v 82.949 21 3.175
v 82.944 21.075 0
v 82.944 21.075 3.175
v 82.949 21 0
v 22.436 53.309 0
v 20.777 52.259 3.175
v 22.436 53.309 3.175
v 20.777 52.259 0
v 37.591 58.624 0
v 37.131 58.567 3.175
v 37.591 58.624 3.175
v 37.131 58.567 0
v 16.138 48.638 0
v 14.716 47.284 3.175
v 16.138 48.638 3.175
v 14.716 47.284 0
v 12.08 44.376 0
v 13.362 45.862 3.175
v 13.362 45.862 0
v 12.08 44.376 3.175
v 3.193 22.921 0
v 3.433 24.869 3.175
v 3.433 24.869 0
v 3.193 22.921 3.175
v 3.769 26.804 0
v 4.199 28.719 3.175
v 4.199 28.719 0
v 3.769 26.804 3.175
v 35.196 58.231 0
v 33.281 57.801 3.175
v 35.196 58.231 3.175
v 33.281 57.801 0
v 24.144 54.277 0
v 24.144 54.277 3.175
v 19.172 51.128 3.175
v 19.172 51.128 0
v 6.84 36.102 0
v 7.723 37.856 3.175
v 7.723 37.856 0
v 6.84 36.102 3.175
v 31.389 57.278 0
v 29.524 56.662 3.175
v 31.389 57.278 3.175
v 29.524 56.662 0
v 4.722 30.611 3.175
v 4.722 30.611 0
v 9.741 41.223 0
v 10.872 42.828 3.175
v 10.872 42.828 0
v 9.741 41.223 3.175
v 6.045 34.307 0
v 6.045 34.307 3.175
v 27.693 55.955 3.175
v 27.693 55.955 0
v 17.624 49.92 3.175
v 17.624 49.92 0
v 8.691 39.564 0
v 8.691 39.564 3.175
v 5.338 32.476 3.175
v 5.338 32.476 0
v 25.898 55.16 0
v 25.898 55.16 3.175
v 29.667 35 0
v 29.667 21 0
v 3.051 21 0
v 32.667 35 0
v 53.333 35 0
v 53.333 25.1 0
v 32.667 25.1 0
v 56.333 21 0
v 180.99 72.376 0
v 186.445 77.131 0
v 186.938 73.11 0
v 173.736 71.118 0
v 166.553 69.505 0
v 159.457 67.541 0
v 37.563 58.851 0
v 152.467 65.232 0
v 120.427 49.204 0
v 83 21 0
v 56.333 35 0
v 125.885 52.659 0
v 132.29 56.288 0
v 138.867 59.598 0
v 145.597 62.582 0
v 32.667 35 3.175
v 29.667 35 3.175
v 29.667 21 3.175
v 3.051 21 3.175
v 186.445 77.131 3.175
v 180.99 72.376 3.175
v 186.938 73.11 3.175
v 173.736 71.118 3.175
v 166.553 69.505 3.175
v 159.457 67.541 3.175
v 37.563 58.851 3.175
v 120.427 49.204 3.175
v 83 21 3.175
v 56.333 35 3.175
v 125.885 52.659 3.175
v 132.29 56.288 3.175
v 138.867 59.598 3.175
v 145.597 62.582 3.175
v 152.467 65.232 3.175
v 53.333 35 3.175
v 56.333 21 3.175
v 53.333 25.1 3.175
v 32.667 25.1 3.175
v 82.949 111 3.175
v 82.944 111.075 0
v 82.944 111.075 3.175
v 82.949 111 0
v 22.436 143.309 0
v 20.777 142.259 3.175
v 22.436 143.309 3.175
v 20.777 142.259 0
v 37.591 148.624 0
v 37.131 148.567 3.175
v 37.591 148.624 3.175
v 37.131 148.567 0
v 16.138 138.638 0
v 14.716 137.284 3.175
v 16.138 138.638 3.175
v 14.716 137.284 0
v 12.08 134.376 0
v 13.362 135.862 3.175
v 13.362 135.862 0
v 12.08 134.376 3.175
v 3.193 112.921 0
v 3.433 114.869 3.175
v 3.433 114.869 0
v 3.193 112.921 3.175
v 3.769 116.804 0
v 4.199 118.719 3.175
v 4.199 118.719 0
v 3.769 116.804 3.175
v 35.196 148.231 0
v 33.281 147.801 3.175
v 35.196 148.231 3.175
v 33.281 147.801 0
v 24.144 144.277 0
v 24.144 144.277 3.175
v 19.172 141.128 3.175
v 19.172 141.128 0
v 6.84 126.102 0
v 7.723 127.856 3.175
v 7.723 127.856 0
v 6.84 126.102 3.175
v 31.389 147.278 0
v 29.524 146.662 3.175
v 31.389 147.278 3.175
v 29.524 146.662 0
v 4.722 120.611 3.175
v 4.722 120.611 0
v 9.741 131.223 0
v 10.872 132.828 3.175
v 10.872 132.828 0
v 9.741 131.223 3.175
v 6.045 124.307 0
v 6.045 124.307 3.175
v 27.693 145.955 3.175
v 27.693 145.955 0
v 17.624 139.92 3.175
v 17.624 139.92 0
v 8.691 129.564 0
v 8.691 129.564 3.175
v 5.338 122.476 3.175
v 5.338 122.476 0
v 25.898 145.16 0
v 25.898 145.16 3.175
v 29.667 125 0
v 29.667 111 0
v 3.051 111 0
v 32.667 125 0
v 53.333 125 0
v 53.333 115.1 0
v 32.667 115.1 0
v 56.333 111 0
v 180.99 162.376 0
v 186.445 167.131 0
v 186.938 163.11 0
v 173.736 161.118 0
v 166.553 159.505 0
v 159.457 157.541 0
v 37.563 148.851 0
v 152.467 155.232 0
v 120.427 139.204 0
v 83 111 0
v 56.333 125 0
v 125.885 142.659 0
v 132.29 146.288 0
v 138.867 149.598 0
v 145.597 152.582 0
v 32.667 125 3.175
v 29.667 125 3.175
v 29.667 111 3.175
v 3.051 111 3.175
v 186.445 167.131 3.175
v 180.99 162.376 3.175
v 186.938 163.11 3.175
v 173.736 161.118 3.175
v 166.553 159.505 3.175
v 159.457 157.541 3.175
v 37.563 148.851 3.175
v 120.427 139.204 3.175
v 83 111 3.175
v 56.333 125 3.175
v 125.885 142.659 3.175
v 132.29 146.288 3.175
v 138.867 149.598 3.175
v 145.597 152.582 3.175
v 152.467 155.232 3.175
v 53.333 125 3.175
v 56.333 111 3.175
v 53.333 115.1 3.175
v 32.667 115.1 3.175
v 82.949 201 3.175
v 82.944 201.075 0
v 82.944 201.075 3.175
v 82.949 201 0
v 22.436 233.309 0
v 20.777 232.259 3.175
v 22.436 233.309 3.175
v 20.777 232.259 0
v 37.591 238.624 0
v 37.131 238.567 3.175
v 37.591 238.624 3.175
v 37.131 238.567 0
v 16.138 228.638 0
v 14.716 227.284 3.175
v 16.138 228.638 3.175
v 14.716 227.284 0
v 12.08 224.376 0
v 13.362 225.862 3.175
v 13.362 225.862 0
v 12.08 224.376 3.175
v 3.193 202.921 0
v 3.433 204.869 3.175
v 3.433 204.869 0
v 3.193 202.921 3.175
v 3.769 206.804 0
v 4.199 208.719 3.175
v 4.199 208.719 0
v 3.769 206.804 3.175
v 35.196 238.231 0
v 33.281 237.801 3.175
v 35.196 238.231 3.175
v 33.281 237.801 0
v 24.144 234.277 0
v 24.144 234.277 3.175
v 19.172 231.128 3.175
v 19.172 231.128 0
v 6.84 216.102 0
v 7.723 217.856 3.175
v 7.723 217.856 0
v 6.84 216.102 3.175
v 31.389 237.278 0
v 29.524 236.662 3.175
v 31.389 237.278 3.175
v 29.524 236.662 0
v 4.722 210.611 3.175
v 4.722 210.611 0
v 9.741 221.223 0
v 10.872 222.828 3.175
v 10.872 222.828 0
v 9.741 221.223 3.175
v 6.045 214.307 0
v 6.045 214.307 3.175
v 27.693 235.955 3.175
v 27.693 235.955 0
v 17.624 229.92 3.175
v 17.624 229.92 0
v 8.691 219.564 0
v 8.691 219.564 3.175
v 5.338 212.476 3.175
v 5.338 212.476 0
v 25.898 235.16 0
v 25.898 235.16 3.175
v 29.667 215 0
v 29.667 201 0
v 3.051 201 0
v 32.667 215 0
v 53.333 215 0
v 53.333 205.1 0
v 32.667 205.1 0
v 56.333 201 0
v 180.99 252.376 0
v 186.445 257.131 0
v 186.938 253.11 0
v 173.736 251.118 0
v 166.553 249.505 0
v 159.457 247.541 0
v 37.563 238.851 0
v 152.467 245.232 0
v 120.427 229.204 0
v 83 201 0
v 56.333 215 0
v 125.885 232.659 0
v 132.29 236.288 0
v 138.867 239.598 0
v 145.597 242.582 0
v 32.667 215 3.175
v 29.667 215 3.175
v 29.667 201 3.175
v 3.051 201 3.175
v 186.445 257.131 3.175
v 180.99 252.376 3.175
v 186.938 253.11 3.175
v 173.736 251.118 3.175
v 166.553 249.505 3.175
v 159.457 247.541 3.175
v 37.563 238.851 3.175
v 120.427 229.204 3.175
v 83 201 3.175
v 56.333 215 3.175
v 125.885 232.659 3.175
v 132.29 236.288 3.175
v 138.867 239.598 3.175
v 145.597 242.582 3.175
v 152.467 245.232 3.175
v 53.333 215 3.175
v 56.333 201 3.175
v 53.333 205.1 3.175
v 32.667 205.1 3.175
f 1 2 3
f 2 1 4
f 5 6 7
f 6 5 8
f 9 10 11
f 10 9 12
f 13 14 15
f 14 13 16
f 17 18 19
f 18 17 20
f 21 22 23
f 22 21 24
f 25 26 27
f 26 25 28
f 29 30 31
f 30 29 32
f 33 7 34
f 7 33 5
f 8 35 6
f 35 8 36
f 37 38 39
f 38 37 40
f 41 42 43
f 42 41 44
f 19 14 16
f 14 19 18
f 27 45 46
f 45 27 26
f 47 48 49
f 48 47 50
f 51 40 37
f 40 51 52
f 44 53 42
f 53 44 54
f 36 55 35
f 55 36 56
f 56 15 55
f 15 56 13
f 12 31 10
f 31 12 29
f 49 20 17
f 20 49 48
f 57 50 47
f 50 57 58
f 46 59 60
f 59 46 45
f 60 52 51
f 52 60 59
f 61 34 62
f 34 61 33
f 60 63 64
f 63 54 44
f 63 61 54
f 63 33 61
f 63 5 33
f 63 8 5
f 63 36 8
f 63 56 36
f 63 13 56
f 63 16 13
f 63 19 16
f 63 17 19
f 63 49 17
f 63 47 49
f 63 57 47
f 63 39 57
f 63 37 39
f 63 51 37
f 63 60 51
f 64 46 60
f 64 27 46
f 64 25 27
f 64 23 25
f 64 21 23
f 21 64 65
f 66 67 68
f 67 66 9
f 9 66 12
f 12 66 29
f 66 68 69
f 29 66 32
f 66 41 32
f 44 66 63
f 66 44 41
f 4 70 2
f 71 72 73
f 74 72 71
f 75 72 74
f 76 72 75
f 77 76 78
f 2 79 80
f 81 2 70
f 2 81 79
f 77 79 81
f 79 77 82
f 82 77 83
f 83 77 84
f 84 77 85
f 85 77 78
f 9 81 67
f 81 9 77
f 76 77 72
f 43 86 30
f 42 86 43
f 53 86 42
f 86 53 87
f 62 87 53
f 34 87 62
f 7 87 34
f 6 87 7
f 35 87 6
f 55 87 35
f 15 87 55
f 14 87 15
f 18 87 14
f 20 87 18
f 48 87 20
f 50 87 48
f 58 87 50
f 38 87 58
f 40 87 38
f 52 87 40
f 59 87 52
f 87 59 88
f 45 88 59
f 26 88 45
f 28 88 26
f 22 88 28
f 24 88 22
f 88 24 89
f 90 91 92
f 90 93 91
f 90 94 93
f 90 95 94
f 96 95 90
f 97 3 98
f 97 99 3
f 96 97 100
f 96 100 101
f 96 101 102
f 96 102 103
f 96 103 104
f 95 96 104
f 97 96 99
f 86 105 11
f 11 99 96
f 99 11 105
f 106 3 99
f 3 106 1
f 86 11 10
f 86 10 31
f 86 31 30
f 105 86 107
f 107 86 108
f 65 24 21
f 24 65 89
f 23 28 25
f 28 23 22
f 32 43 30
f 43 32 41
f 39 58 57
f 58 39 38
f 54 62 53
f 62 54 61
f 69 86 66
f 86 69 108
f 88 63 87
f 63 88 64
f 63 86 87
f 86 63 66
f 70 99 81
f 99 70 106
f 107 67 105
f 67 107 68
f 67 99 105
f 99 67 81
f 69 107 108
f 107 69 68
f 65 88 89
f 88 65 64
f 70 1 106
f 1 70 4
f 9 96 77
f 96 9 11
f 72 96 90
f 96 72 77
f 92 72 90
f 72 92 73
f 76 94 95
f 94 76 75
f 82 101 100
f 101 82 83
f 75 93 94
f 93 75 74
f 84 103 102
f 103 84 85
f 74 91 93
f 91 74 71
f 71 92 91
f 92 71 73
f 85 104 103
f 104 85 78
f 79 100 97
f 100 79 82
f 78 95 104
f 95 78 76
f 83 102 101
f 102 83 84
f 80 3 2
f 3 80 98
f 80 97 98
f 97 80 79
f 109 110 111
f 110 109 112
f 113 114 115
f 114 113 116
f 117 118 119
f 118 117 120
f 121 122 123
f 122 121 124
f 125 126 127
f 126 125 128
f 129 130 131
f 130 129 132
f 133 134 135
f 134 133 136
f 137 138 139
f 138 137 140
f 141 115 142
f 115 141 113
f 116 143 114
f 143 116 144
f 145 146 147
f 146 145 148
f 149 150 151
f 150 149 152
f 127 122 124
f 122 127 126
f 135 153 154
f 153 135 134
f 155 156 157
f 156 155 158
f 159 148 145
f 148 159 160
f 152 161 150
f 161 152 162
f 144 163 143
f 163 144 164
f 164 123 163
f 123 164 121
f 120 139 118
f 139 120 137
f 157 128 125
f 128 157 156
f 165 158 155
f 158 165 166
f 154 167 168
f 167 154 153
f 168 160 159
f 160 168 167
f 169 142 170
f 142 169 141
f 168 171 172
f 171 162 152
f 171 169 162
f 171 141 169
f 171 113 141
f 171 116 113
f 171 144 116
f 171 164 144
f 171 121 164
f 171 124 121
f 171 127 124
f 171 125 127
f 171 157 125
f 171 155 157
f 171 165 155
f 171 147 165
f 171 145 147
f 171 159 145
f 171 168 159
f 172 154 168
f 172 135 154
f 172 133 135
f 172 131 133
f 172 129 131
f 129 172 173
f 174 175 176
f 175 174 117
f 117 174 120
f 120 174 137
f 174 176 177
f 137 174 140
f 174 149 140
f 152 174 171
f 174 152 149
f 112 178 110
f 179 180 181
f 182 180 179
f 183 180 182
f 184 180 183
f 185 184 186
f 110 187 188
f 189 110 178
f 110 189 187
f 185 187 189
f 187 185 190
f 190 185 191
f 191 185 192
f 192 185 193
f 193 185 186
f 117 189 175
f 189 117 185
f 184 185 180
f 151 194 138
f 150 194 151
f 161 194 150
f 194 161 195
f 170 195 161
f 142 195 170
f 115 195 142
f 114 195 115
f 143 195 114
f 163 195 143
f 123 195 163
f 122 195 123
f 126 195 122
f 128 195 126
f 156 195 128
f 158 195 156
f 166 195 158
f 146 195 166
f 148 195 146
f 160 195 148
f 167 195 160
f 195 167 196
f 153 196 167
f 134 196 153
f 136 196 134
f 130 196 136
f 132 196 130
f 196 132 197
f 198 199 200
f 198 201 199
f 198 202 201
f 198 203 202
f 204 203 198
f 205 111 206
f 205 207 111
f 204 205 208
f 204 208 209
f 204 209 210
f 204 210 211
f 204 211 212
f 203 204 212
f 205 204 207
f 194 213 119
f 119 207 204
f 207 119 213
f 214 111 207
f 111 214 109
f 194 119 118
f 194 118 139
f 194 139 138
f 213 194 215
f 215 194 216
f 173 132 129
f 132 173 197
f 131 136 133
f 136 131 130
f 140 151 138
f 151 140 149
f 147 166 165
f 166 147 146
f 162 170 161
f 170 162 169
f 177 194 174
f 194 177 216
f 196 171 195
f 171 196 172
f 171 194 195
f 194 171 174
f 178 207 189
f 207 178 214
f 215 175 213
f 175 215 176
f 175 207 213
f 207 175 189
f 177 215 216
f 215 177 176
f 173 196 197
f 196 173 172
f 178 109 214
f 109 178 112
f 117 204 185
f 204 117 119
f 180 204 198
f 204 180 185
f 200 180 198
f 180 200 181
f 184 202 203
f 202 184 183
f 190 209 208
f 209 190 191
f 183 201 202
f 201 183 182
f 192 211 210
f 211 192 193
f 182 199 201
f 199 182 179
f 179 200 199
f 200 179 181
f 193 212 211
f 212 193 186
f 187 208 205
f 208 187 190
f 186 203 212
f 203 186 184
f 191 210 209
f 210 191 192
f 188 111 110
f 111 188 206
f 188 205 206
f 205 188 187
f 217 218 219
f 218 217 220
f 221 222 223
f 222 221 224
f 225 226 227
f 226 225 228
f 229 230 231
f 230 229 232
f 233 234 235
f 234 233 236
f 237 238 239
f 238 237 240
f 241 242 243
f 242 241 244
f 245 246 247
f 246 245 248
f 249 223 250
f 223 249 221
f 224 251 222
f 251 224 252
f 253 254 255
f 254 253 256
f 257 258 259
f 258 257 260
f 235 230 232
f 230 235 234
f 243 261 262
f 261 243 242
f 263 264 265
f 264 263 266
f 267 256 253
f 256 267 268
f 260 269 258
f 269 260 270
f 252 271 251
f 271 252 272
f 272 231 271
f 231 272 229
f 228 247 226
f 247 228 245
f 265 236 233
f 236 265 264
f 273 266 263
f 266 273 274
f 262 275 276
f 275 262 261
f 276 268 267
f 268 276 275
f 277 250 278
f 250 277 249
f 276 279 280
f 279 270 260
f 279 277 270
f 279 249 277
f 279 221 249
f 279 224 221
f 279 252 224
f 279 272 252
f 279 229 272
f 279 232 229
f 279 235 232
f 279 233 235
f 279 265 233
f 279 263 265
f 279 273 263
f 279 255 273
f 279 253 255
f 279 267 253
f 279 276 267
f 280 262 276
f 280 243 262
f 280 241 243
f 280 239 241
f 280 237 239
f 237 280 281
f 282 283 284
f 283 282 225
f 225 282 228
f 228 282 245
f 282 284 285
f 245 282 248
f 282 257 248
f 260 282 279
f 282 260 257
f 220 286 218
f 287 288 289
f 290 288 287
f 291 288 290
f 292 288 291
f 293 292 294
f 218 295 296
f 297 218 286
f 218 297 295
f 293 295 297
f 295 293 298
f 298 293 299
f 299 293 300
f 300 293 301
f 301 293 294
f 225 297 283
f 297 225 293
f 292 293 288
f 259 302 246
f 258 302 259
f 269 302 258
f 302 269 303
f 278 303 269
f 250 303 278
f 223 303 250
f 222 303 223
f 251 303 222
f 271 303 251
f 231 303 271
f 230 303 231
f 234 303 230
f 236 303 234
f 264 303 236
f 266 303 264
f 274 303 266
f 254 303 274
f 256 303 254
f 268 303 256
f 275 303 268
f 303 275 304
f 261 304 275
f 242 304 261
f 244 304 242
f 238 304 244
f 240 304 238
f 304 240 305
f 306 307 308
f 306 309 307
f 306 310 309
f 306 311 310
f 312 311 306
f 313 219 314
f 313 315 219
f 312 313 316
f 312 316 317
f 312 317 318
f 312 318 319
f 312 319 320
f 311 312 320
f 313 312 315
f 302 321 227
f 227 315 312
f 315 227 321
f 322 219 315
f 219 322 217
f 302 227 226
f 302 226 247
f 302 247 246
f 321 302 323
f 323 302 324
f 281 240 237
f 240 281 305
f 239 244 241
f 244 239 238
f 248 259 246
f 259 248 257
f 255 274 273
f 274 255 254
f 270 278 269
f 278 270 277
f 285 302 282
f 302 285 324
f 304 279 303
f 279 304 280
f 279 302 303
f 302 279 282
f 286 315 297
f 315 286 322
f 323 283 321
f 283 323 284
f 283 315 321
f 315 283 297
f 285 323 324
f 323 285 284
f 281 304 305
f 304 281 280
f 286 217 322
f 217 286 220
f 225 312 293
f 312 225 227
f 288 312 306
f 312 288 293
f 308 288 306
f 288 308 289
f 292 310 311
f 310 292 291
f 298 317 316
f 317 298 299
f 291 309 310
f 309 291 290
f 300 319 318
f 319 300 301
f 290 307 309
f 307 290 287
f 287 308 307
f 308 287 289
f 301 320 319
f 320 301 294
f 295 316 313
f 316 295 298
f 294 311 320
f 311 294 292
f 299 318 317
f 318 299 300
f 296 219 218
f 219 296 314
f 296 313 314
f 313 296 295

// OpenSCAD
// file: ../libs/bearing_mount_lib.scad
module rounded_rect_x (r, l, h) {
   $rect_l = l;
   $rect_w = 4 * r;
   $rect_h = h;
   union () {
	   translate([2*r, 0, 0]) {
		    cube([$rect_l, $rect_w, $rect_h]);
	   }
	   translate([2*r, 2*r, 0]) {
		    cylinder(r=2*r, h=h);
	   }
	   translate([2*r+l, 2*r, 0]) {
		    cylinder(r=2*r, h=h);
	   }  
   }
}

module rounded_rect_p_x (r, l, h) {
   difference () {
      rounded_rect_x(r, l, h);
      translate([2*r, 2*r, -1])  {
         cylinder(r=r, h=h+2);
      }  
      translate([2*r, l+2*r, -1])  {
         cylinder(r=r, h=h+2);
      } 
   }
}

module rounded_rect_y (r, l, h) {
   $rect_l = l;
   $rect_w = 4 * r;
   $rect_h = h;
   union () {
	   translate([0, 2*r, 0]) {
		    cube([$rect_w, $rect_l, $rect_h]);
	   }
	   translate([2*r, 2*r, 0]) {
		    cylinder(r=2*r, h=h);
	   }
	   translate([2*r, 2*r+l, 0]) {
		    cylinder(r=2*r, h=h);
	   }  
   }
}


module rounded_rect_p_y (r, l, h) {
   difference () {
      rounded_rect_y(r, l, h);
      translate([2*r, 2*r, -1])  {
         cylinder(r=r, h=h+2);
      }  
      translate([2*r, l+2*r, -1])  {
         cylinder(r=r, h=h+2);
      } 
   }
}

$pierced = 1;
if (1 == $pierced) {
   union () {
      rounded_rect_p_x(r=5, l=60, h=6.35);
      rounded_rect_p_y(r=5, l=60, h=6.35);
   }
} else {
   union () {
      rounded_rect_x(r=5, l=60, h=6.35);
      rounded_rect_y(r=5, l=60, h=6.35);
   }
}

module mitered_box_x (ww, ll, hh) {
   $rr=ww/3;
   $lll = ll - 2*$rr; 
   translate ([$rr,$rr,0]) {
      minkowski() {
         cube([$lll,$rr,hh]);
         cylinder(r=$rr,h=hh);
      }
   }
}

module mitered_box_y (ww, ll, hh) {
   $rr=ww/3;
   $lll = ll - 2*$rr; 
   translate ([$rr,$rr,0]) {
      minkowski() {
         cube([$rr,$lll,hh]);
         cylinder(r=$rr,h=hh);
      }
   }
}

module duemilanove_hole_pattern_x (depth) {
    translate([0,0,0]) {
       cylinder(r=1.5,h=depth);
    }
    translate([0,27.9,0]) {
       cylinder(r=1.5,h=depth);
    }
    translate([50.8,27.9 + 15.2,0]) {
       cylinder(r=1.5,h=depth);
    }
}

module duemilanove_hole_pattern_y (depth) {
    translate([0,0,0]) {
       cylinder(r=1.5,h=depth);
    }
    translate([27.9,0,0]) {
       cylinder(r=1.5,h=depth);
    }
    translate([27.9 + 15.2, 50.8,0]) {
       cylinder(r=1.5,h=depth);
    }
}

module workspace_bounds(x, y) {
   translate([-5, -5, 0]) {
      difference() {
         translate([0,0,0]) {
             cube([x+10,y+10,$eigth]);
         }
         translate([5,5,-1]) {
             cube([x,y,$eigth+2]);
         }
      }
   }
}
// main file
use <../libs/bearing_mount_lib.scad>

$inch = 25.4;
$half = $inch/2;
$quarter = $inch/4;
$eigth = $inch/8;
$sixteenth = $inch/16;
$thirtysecondth = $inch/32;

$2d = 0;              // set to one for final rendering as 
                      // 2d projection, before exporting as 
                      // .dxf format file

$slot_width = 3.0;      // thickness of material
$rotating_slots = 2;  // is this used?
$center_hole = 0;     // true puts a hole in disk

$fn=128;

module make_parts() {
//  workspace_bounds(265,300);
// translation for final fit to workspace
translate([2, -1, 0]) {
   // make integration fans
   translate([1,20,0]) {
      // grid of h x v elements
      for (h = [0:0]) {
          for (v = [0:2]) {
            //jiggle and joggle them to fit workspace
            translate([120 * h, 90*v, 0]) {
                exterior_half_circle_y(40,10,12);
                difference() {
                   translate([37, 20, 0]) {
                      rotate([0,0,7]) {
                         cube([150,20,$eigth]);
                      }
                   }
                   translate([200,-95,-1]) {
                      cylinder(r=150, h=$eigth+2);
                   }
                }
                translate([80, 2, 0]) {
                   rotate([0,0,37]) {
                      cube([48,20,$eigth]);
                   }
                }
                translate([70, 15, 0]) {
                   rotate([0,0,0]) {
                      cube([10,10,$eigth]);
                   }
                }
            } 
         }
      }
   }
 }
}

module exterior_half_circle_y(radius, center, slot) {
// measuring stick
//    translate ([28,2,0]) {
//        cube([1,13.5,1]);
//    }
    difference() {
       translate([0, 0, 0]) {
          half_circle_y(radius);
       }
       translate([radius-(radius/3),center-4,-1]) {
          cube([$slot_width,center,$eigth+2]);
       }
       translate([radius+(radius/3)-$slot_width,center-4,-1]) {
          cube([$slot_width,center,$eigth+2]);
       }
       translate([2*radius/3, -1, -1]) {
          cube([2*radius/3,center+1.1-4,$eigth+2]);
       }
       translate([0,-1,-1]) {
          cube([2*radius,2+1,$eigth+2]);
       }
   }
}

module make_full_circle_with_slots(radius, slots, slot_len) {
   $slot_c = slots;
   $degrees = 360/slots;
   translate([radius, radius, 0]) {
      difference() {
         cylinder(r=radius, h=$eigth);
         if ($center_hole) {
            translate([0,0,-1]) {
               cylinder(r=3 * $inch/8, h=$eigth+2);
            }
         }
         for (i = [0 : $slot_c - 1])  {
            rotate(a=(i * $degrees), v = [0,0,1]) {
               translate([radius - slot_len,-1.5,-1]) {
                  cube([slot_len,3,$eigth+2]);
               }
           }
         }
      }
   }
}

module half_circle_y(radius) {
   translate([radius,0,0]) {
      difference() {
	      cylinder(r=radius, h=$eigth);
		   translate([-radius,-radius,-1]) {
		      cube([2*radius,radius,$eigth+2]);
		   }
	   }
   }
}

if ($2d) {
    projection(cut=true) {
       translate([0,0,0]) rotate([0,0,0]) {
         make_parts();
       }
}
} else {
    make_parts();
//  for measuring and calibrating
//    translate([60,40,0]) {
//      cube([20,5,1]);
//    }
}

module foo() {
difference() {
                       cube([150,25,10]);
                       translate([139,-110,-1]) {
                          cylinder(r=125, h=12);
                       }
                   }
}
